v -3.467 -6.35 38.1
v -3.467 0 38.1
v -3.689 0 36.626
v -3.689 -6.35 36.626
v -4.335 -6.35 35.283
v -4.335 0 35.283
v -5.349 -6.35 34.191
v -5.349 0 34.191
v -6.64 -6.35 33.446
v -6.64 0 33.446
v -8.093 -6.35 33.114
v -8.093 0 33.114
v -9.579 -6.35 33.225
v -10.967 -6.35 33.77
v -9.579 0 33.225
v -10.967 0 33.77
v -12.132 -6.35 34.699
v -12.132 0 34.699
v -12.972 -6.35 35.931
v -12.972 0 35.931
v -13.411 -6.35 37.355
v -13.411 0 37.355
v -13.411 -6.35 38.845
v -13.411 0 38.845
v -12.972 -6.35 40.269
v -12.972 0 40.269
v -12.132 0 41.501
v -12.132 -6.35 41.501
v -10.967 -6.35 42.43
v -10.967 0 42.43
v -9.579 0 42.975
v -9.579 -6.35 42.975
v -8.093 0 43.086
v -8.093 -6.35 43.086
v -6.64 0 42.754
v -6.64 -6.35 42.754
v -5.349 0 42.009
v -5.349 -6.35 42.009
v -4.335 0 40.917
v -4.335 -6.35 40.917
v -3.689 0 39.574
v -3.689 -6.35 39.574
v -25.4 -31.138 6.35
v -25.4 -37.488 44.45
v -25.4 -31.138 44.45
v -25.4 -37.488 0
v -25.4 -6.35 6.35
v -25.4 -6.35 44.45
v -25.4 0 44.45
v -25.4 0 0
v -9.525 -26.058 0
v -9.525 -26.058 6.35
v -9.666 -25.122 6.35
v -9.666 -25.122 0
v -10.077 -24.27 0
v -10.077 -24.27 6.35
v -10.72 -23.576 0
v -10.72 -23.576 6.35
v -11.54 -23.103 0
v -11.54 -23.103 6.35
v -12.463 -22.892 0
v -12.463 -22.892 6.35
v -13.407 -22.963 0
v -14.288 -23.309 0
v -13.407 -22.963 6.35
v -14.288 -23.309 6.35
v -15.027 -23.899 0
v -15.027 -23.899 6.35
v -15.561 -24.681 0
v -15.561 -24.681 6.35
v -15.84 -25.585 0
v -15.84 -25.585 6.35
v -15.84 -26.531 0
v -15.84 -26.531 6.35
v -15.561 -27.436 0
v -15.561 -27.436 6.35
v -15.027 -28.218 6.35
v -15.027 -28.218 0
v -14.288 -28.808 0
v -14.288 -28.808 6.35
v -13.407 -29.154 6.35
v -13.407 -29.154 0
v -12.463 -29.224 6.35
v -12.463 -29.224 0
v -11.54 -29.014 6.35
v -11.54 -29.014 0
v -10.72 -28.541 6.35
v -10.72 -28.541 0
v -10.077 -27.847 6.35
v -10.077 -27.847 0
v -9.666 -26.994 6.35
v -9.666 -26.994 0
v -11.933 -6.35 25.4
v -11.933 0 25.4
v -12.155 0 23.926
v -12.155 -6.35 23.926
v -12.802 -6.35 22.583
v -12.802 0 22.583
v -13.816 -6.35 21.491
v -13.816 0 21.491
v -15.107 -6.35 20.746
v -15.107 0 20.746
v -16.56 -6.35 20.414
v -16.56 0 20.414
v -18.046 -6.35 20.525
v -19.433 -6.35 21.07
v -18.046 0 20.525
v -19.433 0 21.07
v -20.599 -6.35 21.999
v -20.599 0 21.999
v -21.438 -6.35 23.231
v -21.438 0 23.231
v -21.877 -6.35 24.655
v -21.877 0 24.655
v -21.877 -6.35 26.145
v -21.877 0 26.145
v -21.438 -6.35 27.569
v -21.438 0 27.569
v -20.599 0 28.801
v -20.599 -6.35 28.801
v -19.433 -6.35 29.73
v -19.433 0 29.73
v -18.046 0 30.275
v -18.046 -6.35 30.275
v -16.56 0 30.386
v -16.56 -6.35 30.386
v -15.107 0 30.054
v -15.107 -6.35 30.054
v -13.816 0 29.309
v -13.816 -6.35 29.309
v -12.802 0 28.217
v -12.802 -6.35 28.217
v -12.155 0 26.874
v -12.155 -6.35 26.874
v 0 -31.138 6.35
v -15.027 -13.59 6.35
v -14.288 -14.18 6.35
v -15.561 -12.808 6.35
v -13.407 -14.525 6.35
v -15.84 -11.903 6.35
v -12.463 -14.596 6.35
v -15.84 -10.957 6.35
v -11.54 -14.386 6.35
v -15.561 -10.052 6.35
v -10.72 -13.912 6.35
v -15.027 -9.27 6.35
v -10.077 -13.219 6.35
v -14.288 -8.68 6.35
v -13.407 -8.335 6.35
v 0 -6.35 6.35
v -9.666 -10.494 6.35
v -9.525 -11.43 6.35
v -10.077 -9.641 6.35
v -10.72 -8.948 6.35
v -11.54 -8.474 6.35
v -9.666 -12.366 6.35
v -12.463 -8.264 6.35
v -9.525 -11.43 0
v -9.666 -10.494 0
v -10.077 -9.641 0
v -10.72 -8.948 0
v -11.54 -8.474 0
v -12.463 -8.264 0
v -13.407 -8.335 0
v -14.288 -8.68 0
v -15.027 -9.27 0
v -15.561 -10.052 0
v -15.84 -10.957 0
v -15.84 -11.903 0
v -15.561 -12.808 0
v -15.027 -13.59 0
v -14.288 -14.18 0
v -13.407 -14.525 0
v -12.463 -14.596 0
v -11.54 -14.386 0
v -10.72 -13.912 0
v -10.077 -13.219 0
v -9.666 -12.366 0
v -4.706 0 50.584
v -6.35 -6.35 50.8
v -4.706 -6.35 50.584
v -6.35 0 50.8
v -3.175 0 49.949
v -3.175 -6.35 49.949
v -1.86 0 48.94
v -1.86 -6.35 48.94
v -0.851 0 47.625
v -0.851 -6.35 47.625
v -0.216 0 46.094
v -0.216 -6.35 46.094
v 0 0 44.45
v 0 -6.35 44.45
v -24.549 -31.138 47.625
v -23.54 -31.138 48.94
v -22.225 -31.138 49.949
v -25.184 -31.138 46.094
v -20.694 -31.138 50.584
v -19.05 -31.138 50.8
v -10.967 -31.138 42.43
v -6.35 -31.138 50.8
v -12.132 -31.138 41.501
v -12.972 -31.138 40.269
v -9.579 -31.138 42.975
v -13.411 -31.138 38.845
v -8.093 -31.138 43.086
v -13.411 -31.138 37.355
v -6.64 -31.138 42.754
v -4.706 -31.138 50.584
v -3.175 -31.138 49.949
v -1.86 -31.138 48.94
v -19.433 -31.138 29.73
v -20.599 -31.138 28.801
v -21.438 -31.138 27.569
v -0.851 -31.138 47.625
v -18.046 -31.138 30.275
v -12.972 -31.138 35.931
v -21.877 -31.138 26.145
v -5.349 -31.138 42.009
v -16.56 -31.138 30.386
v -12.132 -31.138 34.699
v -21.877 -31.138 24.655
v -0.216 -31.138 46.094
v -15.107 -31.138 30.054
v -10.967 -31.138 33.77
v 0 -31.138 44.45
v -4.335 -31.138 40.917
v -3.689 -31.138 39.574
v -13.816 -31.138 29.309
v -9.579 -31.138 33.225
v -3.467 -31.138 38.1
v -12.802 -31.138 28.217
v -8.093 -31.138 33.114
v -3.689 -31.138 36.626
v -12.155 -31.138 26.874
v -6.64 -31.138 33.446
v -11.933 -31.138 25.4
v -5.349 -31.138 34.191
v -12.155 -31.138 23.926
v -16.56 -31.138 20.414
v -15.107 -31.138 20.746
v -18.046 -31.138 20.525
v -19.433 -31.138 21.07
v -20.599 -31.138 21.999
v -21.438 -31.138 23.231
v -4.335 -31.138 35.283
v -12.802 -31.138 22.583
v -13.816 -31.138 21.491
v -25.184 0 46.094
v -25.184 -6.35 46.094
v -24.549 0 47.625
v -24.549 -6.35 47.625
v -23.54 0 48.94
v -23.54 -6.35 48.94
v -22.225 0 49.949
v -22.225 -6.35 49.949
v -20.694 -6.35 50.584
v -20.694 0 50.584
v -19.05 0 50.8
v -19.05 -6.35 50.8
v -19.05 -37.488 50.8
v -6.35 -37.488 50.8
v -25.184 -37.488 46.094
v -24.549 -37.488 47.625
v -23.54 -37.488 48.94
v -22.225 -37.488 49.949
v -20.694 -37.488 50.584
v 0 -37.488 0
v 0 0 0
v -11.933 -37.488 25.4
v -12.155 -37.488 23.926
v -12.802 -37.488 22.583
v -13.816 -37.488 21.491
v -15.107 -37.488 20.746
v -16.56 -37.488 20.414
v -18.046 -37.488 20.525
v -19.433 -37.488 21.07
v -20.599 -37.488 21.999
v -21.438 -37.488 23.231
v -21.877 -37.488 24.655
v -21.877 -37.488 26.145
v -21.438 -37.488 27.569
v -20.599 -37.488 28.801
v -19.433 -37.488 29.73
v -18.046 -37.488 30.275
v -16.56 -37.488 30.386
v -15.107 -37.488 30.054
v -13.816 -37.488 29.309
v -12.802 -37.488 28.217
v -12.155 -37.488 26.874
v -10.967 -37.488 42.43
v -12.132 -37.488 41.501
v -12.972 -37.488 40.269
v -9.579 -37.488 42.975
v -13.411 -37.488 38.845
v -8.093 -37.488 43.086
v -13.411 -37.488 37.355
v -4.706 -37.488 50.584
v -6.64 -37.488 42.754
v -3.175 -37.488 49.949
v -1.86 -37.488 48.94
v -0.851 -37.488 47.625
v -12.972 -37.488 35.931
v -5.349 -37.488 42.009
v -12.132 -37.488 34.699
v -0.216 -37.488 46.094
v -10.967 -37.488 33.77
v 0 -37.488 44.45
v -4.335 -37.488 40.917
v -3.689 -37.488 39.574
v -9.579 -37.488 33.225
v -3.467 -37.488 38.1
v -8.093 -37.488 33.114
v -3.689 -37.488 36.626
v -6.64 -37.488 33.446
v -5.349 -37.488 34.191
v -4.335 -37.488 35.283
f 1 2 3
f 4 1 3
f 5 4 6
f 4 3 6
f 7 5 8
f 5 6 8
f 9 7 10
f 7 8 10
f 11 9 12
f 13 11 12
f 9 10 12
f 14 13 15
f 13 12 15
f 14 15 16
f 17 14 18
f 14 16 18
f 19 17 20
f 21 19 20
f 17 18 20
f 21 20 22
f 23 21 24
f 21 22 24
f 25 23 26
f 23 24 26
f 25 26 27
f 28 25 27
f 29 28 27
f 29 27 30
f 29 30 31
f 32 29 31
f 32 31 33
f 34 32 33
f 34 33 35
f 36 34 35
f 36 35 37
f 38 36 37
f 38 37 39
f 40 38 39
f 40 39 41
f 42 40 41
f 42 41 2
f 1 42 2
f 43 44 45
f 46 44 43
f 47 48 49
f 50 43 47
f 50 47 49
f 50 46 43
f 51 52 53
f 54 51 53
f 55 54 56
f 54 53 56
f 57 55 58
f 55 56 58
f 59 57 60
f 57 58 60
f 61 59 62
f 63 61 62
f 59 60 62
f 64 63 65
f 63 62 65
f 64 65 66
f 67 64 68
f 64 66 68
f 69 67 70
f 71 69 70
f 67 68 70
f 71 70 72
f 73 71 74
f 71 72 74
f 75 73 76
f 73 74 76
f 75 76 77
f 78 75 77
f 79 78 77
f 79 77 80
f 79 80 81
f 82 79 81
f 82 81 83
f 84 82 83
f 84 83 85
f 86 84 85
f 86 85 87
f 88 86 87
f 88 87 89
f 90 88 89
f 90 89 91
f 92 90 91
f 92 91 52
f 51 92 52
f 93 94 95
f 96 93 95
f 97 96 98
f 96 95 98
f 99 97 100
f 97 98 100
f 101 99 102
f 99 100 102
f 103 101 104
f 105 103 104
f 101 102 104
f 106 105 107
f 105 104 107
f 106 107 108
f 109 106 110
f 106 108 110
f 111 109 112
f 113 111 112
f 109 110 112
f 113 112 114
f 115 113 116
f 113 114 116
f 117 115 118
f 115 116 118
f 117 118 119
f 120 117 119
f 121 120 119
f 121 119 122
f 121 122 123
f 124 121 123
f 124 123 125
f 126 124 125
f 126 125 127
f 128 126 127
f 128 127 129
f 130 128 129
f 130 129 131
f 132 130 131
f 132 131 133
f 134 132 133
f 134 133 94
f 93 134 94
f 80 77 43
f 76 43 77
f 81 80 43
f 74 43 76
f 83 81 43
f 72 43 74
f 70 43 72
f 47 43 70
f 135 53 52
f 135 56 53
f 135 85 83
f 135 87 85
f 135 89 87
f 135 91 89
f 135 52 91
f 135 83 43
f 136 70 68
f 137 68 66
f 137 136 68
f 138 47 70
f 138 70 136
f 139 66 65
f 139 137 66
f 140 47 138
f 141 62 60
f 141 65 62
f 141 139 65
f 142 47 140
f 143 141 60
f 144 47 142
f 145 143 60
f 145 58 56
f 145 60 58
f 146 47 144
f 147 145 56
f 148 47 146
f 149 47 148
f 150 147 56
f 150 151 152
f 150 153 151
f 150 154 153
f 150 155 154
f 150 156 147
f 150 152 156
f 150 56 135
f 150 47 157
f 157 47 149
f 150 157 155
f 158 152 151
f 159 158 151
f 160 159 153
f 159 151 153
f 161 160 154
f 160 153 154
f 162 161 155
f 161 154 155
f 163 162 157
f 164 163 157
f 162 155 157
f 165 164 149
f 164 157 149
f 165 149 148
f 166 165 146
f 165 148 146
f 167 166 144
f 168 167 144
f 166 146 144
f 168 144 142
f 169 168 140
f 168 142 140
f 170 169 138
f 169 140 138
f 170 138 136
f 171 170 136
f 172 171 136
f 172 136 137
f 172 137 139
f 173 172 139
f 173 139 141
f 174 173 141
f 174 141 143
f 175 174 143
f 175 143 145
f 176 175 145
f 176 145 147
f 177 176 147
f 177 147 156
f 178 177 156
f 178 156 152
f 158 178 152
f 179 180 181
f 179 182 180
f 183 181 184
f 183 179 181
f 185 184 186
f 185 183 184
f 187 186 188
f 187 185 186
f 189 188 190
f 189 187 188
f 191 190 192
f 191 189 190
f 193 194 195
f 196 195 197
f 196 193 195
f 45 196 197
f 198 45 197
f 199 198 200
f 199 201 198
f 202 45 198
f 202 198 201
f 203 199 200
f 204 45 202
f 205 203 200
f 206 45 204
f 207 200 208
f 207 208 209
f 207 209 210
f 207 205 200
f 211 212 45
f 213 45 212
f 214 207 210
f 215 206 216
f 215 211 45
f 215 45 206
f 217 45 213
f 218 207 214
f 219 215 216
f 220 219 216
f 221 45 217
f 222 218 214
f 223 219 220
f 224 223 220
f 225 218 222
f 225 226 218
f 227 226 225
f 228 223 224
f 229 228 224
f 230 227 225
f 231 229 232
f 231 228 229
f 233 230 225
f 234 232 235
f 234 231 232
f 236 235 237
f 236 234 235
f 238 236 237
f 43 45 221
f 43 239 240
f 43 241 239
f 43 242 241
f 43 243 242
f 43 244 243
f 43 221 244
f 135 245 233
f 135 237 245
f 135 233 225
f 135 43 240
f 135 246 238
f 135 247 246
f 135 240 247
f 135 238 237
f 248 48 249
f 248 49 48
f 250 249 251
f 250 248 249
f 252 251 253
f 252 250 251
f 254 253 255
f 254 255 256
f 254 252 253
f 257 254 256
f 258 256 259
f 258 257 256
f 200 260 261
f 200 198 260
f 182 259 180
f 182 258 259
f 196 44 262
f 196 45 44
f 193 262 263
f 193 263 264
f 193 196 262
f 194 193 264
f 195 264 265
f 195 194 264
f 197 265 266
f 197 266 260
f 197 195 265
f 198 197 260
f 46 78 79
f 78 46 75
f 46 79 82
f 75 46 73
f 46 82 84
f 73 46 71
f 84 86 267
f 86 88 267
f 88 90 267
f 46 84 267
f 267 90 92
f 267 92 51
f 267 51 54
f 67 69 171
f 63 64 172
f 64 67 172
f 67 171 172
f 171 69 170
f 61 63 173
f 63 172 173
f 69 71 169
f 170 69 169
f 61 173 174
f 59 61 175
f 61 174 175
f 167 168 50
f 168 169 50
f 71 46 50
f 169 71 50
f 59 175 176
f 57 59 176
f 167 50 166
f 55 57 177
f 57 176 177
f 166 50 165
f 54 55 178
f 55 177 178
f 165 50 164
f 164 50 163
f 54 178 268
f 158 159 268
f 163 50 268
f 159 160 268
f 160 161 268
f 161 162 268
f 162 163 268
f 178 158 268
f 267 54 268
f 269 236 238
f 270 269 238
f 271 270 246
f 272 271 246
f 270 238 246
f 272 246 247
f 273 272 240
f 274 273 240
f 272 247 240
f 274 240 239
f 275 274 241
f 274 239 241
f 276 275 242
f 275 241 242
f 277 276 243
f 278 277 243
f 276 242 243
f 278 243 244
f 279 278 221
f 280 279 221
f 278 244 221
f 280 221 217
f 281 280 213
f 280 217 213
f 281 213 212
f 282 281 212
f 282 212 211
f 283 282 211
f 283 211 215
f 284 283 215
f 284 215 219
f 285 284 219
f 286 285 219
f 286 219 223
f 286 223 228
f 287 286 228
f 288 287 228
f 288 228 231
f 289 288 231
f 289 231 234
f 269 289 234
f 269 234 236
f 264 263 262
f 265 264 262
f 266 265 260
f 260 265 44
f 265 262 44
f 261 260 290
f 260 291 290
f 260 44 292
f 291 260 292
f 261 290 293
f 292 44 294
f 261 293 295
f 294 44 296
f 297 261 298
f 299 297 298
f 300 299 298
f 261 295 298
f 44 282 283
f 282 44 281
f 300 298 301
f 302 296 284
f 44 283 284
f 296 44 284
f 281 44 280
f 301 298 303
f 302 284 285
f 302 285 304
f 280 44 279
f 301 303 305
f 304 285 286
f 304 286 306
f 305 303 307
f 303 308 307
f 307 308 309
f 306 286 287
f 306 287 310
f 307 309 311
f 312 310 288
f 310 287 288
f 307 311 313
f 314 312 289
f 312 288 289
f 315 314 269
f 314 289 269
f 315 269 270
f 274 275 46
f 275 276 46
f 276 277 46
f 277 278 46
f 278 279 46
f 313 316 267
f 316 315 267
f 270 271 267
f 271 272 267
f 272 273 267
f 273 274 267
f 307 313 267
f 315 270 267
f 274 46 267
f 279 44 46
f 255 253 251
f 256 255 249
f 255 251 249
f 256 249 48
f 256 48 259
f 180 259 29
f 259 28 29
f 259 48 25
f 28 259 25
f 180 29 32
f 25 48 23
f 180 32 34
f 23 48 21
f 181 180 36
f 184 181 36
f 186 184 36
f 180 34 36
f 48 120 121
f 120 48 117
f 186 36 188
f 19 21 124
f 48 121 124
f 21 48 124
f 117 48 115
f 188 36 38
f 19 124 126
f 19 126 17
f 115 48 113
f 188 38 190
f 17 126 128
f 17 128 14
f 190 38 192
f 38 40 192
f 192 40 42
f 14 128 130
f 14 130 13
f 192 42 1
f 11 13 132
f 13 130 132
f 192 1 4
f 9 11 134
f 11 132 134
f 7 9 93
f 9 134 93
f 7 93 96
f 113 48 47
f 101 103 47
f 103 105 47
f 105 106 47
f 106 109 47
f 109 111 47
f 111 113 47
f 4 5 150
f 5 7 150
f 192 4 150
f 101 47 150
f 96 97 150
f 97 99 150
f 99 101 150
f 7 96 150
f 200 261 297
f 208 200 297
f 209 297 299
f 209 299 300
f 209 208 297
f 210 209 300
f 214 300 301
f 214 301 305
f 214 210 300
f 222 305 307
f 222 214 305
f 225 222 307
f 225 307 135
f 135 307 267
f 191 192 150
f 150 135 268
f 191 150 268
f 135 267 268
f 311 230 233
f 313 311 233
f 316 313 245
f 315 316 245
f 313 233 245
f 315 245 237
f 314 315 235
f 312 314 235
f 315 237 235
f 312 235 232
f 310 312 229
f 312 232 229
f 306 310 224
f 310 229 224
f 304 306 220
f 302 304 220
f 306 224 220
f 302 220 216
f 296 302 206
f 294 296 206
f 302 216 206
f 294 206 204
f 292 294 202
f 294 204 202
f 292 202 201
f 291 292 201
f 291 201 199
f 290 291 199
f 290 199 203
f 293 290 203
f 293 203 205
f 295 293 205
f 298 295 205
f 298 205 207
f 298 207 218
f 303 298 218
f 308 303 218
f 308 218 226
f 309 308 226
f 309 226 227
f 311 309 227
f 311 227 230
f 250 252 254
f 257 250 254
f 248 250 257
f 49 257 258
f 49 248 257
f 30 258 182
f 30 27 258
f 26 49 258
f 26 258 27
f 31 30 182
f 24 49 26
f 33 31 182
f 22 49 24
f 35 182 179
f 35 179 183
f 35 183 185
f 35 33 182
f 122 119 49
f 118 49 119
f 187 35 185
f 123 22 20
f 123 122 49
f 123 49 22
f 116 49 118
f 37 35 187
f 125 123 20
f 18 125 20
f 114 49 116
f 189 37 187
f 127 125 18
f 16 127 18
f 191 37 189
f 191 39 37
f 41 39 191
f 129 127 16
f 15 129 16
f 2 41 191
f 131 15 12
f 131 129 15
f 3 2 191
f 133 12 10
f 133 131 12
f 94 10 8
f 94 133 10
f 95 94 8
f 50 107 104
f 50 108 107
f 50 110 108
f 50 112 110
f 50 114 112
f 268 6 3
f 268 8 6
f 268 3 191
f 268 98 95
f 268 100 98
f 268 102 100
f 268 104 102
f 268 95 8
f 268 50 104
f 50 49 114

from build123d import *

# Parameters (mm, degrees)
SKETCH1_W           = 25.4
SKETCH1_H           = 6.35
SKETCH1_H_2         = 24.788235472
BOSS_EXTRUDE1_DEPTH = 6.35
SKETCH2_W           = 25.4
SKETCH2_H           = 6.35
BOSS_EXTRUDE2_DEPTH = 44.45
SKETCH3_R           = 3.175
CUT_EXTRUDE1_DEPTH  = 38.1
SKETCH6_R           = 5
CUT_EXTRUDE2_DEPTH  = 38.488235472
FILLET1_R           = 6.35


with BuildPart() as part:
    # Sketch1 → Boss-Extrude1 (new body)
    with BuildSketch(Plane.XY):
        with Locations((-12.7, -34.313235472)):
            Rectangle(SKETCH1_W, SKETCH1_H)
        with Locations((-12.7, -18.744117736)):
            Rectangle(SKETCH1_W, SKETCH1_H_2)
        with Locations((-12.7, -3.175)):
            Rectangle(SKETCH1_W, SKETCH1_H)
    extrude(amount=BOSS_EXTRUDE1_DEPTH)

    # Sketch2 → Boss-Extrude2 (add)
    with BuildSketch(Plane.XY.offset(6.35)):
        with Locations((-12.7, -3.175)):
            Rectangle(SKETCH2_W, SKETCH2_H)
        with Locations((-12.7, -34.313235472)):
            Rectangle(SKETCH2_W, SKETCH2_H)
    extrude(amount=BOSS_EXTRUDE2_DEPTH)

    # Sketch3 → Cut-Extrude1 (cut)
    with BuildSketch(Plane.XY.offset(6.35)):
        with Locations((-12.7, -26.058235472)):
            Circle(SKETCH3_R)
        with Locations((-12.7, -11.43)):
            Circle(SKETCH3_R)
    extrude(amount=-CUT_EXTRUDE1_DEPTH, mode=Mode.SUBTRACT)

    # Sketch6 → Cut-Extrude2 (cut, through all)
    with BuildSketch(Plane(origin=(0, 0, 0), x_dir=(1, 0, 0), z_dir=(0, 1, 0))):
        with Locations((-16.933333333, -25.4)):
            Circle(SKETCH6_R)
        with Locations((-8.466666667, -38.1)):
            Circle(SKETCH6_R)
    extrude(amount=-CUT_EXTRUDE2_DEPTH, mode=Mode.SUBTRACT)

    # Fillet1
    fillet1_edges = [part.edges().sort_by_distance(p)[0] for p in [
        (0, -3.175, 50.8),
        (-25.4, -3.175, 50.8),
        (-25.4, -34.313235472, 50.8),
        (0, -34.313235472, 50.8),
    ]]
    fillet(fillet1_edges, radius=FILLET1_R)


solid = part.part
